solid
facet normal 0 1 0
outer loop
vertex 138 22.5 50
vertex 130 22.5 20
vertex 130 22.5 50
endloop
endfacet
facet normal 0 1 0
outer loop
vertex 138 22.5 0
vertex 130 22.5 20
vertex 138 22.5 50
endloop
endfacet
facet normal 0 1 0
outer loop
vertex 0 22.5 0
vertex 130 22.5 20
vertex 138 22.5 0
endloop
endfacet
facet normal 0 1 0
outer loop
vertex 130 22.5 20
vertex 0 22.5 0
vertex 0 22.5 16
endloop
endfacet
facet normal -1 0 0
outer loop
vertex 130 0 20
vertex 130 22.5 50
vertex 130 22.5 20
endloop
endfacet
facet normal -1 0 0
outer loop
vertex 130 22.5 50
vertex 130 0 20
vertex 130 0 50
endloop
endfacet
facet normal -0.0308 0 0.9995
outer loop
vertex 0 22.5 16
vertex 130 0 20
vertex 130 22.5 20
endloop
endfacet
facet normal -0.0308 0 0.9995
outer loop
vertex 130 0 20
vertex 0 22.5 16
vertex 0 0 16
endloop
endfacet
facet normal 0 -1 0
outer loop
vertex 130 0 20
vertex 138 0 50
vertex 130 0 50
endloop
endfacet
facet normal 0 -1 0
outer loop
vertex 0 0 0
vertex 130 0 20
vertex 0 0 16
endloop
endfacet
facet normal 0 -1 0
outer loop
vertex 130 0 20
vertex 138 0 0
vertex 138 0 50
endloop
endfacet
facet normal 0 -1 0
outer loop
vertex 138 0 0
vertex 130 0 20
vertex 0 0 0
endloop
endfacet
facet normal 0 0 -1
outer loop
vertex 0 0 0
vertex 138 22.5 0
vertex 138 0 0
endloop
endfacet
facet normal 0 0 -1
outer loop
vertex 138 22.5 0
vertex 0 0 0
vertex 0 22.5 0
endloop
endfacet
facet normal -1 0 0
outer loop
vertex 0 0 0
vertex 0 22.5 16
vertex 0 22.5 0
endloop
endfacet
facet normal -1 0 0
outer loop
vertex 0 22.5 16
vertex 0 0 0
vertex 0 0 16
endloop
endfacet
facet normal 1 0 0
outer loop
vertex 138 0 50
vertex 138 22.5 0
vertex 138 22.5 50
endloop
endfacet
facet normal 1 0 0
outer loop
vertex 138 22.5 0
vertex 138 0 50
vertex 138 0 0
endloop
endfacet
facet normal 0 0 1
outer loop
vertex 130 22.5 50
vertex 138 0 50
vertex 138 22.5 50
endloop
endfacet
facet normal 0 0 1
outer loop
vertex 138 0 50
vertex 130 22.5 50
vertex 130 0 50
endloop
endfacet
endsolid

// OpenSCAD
/* [Wedge Dimensions] */
WEDGE_LENGTH = 130; // .1
WEDGE_WIDTH = 22.5; // .1
// Start height
WEDGE_COMMON_HEIGHT = 16; // .1
// Amount of height added over the length of the wedge
WEDGE_SLOPE_END_HEIGHT_ADDITION = 4; // .1

/* [Grip] */
GRIP = true;
GRIP_THICKNESS = 8; // .1
GRIP_LENTGTH = 30; // .1

union() {
  hull() {
    cube([WEDGE_LENGTH, WEDGE_WIDTH, WEDGE_COMMON_HEIGHT]);
    translate([WEDGE_LENGTH, 0, WEDGE_COMMON_HEIGHT + WEDGE_SLOPE_END_HEIGHT_ADDITION]) {
      cube([0.00000000001, WEDGE_WIDTH, 0.00000000001]);
    }
  }
  if (GRIP) {
    translate([WEDGE_LENGTH, 0, 0]) {
      cube([GRIP_THICKNESS, WEDGE_WIDTH, WEDGE_COMMON_HEIGHT + WEDGE_SLOPE_END_HEIGHT_ADDITION + GRIP_LENTGTH]);
    }
  }
}
